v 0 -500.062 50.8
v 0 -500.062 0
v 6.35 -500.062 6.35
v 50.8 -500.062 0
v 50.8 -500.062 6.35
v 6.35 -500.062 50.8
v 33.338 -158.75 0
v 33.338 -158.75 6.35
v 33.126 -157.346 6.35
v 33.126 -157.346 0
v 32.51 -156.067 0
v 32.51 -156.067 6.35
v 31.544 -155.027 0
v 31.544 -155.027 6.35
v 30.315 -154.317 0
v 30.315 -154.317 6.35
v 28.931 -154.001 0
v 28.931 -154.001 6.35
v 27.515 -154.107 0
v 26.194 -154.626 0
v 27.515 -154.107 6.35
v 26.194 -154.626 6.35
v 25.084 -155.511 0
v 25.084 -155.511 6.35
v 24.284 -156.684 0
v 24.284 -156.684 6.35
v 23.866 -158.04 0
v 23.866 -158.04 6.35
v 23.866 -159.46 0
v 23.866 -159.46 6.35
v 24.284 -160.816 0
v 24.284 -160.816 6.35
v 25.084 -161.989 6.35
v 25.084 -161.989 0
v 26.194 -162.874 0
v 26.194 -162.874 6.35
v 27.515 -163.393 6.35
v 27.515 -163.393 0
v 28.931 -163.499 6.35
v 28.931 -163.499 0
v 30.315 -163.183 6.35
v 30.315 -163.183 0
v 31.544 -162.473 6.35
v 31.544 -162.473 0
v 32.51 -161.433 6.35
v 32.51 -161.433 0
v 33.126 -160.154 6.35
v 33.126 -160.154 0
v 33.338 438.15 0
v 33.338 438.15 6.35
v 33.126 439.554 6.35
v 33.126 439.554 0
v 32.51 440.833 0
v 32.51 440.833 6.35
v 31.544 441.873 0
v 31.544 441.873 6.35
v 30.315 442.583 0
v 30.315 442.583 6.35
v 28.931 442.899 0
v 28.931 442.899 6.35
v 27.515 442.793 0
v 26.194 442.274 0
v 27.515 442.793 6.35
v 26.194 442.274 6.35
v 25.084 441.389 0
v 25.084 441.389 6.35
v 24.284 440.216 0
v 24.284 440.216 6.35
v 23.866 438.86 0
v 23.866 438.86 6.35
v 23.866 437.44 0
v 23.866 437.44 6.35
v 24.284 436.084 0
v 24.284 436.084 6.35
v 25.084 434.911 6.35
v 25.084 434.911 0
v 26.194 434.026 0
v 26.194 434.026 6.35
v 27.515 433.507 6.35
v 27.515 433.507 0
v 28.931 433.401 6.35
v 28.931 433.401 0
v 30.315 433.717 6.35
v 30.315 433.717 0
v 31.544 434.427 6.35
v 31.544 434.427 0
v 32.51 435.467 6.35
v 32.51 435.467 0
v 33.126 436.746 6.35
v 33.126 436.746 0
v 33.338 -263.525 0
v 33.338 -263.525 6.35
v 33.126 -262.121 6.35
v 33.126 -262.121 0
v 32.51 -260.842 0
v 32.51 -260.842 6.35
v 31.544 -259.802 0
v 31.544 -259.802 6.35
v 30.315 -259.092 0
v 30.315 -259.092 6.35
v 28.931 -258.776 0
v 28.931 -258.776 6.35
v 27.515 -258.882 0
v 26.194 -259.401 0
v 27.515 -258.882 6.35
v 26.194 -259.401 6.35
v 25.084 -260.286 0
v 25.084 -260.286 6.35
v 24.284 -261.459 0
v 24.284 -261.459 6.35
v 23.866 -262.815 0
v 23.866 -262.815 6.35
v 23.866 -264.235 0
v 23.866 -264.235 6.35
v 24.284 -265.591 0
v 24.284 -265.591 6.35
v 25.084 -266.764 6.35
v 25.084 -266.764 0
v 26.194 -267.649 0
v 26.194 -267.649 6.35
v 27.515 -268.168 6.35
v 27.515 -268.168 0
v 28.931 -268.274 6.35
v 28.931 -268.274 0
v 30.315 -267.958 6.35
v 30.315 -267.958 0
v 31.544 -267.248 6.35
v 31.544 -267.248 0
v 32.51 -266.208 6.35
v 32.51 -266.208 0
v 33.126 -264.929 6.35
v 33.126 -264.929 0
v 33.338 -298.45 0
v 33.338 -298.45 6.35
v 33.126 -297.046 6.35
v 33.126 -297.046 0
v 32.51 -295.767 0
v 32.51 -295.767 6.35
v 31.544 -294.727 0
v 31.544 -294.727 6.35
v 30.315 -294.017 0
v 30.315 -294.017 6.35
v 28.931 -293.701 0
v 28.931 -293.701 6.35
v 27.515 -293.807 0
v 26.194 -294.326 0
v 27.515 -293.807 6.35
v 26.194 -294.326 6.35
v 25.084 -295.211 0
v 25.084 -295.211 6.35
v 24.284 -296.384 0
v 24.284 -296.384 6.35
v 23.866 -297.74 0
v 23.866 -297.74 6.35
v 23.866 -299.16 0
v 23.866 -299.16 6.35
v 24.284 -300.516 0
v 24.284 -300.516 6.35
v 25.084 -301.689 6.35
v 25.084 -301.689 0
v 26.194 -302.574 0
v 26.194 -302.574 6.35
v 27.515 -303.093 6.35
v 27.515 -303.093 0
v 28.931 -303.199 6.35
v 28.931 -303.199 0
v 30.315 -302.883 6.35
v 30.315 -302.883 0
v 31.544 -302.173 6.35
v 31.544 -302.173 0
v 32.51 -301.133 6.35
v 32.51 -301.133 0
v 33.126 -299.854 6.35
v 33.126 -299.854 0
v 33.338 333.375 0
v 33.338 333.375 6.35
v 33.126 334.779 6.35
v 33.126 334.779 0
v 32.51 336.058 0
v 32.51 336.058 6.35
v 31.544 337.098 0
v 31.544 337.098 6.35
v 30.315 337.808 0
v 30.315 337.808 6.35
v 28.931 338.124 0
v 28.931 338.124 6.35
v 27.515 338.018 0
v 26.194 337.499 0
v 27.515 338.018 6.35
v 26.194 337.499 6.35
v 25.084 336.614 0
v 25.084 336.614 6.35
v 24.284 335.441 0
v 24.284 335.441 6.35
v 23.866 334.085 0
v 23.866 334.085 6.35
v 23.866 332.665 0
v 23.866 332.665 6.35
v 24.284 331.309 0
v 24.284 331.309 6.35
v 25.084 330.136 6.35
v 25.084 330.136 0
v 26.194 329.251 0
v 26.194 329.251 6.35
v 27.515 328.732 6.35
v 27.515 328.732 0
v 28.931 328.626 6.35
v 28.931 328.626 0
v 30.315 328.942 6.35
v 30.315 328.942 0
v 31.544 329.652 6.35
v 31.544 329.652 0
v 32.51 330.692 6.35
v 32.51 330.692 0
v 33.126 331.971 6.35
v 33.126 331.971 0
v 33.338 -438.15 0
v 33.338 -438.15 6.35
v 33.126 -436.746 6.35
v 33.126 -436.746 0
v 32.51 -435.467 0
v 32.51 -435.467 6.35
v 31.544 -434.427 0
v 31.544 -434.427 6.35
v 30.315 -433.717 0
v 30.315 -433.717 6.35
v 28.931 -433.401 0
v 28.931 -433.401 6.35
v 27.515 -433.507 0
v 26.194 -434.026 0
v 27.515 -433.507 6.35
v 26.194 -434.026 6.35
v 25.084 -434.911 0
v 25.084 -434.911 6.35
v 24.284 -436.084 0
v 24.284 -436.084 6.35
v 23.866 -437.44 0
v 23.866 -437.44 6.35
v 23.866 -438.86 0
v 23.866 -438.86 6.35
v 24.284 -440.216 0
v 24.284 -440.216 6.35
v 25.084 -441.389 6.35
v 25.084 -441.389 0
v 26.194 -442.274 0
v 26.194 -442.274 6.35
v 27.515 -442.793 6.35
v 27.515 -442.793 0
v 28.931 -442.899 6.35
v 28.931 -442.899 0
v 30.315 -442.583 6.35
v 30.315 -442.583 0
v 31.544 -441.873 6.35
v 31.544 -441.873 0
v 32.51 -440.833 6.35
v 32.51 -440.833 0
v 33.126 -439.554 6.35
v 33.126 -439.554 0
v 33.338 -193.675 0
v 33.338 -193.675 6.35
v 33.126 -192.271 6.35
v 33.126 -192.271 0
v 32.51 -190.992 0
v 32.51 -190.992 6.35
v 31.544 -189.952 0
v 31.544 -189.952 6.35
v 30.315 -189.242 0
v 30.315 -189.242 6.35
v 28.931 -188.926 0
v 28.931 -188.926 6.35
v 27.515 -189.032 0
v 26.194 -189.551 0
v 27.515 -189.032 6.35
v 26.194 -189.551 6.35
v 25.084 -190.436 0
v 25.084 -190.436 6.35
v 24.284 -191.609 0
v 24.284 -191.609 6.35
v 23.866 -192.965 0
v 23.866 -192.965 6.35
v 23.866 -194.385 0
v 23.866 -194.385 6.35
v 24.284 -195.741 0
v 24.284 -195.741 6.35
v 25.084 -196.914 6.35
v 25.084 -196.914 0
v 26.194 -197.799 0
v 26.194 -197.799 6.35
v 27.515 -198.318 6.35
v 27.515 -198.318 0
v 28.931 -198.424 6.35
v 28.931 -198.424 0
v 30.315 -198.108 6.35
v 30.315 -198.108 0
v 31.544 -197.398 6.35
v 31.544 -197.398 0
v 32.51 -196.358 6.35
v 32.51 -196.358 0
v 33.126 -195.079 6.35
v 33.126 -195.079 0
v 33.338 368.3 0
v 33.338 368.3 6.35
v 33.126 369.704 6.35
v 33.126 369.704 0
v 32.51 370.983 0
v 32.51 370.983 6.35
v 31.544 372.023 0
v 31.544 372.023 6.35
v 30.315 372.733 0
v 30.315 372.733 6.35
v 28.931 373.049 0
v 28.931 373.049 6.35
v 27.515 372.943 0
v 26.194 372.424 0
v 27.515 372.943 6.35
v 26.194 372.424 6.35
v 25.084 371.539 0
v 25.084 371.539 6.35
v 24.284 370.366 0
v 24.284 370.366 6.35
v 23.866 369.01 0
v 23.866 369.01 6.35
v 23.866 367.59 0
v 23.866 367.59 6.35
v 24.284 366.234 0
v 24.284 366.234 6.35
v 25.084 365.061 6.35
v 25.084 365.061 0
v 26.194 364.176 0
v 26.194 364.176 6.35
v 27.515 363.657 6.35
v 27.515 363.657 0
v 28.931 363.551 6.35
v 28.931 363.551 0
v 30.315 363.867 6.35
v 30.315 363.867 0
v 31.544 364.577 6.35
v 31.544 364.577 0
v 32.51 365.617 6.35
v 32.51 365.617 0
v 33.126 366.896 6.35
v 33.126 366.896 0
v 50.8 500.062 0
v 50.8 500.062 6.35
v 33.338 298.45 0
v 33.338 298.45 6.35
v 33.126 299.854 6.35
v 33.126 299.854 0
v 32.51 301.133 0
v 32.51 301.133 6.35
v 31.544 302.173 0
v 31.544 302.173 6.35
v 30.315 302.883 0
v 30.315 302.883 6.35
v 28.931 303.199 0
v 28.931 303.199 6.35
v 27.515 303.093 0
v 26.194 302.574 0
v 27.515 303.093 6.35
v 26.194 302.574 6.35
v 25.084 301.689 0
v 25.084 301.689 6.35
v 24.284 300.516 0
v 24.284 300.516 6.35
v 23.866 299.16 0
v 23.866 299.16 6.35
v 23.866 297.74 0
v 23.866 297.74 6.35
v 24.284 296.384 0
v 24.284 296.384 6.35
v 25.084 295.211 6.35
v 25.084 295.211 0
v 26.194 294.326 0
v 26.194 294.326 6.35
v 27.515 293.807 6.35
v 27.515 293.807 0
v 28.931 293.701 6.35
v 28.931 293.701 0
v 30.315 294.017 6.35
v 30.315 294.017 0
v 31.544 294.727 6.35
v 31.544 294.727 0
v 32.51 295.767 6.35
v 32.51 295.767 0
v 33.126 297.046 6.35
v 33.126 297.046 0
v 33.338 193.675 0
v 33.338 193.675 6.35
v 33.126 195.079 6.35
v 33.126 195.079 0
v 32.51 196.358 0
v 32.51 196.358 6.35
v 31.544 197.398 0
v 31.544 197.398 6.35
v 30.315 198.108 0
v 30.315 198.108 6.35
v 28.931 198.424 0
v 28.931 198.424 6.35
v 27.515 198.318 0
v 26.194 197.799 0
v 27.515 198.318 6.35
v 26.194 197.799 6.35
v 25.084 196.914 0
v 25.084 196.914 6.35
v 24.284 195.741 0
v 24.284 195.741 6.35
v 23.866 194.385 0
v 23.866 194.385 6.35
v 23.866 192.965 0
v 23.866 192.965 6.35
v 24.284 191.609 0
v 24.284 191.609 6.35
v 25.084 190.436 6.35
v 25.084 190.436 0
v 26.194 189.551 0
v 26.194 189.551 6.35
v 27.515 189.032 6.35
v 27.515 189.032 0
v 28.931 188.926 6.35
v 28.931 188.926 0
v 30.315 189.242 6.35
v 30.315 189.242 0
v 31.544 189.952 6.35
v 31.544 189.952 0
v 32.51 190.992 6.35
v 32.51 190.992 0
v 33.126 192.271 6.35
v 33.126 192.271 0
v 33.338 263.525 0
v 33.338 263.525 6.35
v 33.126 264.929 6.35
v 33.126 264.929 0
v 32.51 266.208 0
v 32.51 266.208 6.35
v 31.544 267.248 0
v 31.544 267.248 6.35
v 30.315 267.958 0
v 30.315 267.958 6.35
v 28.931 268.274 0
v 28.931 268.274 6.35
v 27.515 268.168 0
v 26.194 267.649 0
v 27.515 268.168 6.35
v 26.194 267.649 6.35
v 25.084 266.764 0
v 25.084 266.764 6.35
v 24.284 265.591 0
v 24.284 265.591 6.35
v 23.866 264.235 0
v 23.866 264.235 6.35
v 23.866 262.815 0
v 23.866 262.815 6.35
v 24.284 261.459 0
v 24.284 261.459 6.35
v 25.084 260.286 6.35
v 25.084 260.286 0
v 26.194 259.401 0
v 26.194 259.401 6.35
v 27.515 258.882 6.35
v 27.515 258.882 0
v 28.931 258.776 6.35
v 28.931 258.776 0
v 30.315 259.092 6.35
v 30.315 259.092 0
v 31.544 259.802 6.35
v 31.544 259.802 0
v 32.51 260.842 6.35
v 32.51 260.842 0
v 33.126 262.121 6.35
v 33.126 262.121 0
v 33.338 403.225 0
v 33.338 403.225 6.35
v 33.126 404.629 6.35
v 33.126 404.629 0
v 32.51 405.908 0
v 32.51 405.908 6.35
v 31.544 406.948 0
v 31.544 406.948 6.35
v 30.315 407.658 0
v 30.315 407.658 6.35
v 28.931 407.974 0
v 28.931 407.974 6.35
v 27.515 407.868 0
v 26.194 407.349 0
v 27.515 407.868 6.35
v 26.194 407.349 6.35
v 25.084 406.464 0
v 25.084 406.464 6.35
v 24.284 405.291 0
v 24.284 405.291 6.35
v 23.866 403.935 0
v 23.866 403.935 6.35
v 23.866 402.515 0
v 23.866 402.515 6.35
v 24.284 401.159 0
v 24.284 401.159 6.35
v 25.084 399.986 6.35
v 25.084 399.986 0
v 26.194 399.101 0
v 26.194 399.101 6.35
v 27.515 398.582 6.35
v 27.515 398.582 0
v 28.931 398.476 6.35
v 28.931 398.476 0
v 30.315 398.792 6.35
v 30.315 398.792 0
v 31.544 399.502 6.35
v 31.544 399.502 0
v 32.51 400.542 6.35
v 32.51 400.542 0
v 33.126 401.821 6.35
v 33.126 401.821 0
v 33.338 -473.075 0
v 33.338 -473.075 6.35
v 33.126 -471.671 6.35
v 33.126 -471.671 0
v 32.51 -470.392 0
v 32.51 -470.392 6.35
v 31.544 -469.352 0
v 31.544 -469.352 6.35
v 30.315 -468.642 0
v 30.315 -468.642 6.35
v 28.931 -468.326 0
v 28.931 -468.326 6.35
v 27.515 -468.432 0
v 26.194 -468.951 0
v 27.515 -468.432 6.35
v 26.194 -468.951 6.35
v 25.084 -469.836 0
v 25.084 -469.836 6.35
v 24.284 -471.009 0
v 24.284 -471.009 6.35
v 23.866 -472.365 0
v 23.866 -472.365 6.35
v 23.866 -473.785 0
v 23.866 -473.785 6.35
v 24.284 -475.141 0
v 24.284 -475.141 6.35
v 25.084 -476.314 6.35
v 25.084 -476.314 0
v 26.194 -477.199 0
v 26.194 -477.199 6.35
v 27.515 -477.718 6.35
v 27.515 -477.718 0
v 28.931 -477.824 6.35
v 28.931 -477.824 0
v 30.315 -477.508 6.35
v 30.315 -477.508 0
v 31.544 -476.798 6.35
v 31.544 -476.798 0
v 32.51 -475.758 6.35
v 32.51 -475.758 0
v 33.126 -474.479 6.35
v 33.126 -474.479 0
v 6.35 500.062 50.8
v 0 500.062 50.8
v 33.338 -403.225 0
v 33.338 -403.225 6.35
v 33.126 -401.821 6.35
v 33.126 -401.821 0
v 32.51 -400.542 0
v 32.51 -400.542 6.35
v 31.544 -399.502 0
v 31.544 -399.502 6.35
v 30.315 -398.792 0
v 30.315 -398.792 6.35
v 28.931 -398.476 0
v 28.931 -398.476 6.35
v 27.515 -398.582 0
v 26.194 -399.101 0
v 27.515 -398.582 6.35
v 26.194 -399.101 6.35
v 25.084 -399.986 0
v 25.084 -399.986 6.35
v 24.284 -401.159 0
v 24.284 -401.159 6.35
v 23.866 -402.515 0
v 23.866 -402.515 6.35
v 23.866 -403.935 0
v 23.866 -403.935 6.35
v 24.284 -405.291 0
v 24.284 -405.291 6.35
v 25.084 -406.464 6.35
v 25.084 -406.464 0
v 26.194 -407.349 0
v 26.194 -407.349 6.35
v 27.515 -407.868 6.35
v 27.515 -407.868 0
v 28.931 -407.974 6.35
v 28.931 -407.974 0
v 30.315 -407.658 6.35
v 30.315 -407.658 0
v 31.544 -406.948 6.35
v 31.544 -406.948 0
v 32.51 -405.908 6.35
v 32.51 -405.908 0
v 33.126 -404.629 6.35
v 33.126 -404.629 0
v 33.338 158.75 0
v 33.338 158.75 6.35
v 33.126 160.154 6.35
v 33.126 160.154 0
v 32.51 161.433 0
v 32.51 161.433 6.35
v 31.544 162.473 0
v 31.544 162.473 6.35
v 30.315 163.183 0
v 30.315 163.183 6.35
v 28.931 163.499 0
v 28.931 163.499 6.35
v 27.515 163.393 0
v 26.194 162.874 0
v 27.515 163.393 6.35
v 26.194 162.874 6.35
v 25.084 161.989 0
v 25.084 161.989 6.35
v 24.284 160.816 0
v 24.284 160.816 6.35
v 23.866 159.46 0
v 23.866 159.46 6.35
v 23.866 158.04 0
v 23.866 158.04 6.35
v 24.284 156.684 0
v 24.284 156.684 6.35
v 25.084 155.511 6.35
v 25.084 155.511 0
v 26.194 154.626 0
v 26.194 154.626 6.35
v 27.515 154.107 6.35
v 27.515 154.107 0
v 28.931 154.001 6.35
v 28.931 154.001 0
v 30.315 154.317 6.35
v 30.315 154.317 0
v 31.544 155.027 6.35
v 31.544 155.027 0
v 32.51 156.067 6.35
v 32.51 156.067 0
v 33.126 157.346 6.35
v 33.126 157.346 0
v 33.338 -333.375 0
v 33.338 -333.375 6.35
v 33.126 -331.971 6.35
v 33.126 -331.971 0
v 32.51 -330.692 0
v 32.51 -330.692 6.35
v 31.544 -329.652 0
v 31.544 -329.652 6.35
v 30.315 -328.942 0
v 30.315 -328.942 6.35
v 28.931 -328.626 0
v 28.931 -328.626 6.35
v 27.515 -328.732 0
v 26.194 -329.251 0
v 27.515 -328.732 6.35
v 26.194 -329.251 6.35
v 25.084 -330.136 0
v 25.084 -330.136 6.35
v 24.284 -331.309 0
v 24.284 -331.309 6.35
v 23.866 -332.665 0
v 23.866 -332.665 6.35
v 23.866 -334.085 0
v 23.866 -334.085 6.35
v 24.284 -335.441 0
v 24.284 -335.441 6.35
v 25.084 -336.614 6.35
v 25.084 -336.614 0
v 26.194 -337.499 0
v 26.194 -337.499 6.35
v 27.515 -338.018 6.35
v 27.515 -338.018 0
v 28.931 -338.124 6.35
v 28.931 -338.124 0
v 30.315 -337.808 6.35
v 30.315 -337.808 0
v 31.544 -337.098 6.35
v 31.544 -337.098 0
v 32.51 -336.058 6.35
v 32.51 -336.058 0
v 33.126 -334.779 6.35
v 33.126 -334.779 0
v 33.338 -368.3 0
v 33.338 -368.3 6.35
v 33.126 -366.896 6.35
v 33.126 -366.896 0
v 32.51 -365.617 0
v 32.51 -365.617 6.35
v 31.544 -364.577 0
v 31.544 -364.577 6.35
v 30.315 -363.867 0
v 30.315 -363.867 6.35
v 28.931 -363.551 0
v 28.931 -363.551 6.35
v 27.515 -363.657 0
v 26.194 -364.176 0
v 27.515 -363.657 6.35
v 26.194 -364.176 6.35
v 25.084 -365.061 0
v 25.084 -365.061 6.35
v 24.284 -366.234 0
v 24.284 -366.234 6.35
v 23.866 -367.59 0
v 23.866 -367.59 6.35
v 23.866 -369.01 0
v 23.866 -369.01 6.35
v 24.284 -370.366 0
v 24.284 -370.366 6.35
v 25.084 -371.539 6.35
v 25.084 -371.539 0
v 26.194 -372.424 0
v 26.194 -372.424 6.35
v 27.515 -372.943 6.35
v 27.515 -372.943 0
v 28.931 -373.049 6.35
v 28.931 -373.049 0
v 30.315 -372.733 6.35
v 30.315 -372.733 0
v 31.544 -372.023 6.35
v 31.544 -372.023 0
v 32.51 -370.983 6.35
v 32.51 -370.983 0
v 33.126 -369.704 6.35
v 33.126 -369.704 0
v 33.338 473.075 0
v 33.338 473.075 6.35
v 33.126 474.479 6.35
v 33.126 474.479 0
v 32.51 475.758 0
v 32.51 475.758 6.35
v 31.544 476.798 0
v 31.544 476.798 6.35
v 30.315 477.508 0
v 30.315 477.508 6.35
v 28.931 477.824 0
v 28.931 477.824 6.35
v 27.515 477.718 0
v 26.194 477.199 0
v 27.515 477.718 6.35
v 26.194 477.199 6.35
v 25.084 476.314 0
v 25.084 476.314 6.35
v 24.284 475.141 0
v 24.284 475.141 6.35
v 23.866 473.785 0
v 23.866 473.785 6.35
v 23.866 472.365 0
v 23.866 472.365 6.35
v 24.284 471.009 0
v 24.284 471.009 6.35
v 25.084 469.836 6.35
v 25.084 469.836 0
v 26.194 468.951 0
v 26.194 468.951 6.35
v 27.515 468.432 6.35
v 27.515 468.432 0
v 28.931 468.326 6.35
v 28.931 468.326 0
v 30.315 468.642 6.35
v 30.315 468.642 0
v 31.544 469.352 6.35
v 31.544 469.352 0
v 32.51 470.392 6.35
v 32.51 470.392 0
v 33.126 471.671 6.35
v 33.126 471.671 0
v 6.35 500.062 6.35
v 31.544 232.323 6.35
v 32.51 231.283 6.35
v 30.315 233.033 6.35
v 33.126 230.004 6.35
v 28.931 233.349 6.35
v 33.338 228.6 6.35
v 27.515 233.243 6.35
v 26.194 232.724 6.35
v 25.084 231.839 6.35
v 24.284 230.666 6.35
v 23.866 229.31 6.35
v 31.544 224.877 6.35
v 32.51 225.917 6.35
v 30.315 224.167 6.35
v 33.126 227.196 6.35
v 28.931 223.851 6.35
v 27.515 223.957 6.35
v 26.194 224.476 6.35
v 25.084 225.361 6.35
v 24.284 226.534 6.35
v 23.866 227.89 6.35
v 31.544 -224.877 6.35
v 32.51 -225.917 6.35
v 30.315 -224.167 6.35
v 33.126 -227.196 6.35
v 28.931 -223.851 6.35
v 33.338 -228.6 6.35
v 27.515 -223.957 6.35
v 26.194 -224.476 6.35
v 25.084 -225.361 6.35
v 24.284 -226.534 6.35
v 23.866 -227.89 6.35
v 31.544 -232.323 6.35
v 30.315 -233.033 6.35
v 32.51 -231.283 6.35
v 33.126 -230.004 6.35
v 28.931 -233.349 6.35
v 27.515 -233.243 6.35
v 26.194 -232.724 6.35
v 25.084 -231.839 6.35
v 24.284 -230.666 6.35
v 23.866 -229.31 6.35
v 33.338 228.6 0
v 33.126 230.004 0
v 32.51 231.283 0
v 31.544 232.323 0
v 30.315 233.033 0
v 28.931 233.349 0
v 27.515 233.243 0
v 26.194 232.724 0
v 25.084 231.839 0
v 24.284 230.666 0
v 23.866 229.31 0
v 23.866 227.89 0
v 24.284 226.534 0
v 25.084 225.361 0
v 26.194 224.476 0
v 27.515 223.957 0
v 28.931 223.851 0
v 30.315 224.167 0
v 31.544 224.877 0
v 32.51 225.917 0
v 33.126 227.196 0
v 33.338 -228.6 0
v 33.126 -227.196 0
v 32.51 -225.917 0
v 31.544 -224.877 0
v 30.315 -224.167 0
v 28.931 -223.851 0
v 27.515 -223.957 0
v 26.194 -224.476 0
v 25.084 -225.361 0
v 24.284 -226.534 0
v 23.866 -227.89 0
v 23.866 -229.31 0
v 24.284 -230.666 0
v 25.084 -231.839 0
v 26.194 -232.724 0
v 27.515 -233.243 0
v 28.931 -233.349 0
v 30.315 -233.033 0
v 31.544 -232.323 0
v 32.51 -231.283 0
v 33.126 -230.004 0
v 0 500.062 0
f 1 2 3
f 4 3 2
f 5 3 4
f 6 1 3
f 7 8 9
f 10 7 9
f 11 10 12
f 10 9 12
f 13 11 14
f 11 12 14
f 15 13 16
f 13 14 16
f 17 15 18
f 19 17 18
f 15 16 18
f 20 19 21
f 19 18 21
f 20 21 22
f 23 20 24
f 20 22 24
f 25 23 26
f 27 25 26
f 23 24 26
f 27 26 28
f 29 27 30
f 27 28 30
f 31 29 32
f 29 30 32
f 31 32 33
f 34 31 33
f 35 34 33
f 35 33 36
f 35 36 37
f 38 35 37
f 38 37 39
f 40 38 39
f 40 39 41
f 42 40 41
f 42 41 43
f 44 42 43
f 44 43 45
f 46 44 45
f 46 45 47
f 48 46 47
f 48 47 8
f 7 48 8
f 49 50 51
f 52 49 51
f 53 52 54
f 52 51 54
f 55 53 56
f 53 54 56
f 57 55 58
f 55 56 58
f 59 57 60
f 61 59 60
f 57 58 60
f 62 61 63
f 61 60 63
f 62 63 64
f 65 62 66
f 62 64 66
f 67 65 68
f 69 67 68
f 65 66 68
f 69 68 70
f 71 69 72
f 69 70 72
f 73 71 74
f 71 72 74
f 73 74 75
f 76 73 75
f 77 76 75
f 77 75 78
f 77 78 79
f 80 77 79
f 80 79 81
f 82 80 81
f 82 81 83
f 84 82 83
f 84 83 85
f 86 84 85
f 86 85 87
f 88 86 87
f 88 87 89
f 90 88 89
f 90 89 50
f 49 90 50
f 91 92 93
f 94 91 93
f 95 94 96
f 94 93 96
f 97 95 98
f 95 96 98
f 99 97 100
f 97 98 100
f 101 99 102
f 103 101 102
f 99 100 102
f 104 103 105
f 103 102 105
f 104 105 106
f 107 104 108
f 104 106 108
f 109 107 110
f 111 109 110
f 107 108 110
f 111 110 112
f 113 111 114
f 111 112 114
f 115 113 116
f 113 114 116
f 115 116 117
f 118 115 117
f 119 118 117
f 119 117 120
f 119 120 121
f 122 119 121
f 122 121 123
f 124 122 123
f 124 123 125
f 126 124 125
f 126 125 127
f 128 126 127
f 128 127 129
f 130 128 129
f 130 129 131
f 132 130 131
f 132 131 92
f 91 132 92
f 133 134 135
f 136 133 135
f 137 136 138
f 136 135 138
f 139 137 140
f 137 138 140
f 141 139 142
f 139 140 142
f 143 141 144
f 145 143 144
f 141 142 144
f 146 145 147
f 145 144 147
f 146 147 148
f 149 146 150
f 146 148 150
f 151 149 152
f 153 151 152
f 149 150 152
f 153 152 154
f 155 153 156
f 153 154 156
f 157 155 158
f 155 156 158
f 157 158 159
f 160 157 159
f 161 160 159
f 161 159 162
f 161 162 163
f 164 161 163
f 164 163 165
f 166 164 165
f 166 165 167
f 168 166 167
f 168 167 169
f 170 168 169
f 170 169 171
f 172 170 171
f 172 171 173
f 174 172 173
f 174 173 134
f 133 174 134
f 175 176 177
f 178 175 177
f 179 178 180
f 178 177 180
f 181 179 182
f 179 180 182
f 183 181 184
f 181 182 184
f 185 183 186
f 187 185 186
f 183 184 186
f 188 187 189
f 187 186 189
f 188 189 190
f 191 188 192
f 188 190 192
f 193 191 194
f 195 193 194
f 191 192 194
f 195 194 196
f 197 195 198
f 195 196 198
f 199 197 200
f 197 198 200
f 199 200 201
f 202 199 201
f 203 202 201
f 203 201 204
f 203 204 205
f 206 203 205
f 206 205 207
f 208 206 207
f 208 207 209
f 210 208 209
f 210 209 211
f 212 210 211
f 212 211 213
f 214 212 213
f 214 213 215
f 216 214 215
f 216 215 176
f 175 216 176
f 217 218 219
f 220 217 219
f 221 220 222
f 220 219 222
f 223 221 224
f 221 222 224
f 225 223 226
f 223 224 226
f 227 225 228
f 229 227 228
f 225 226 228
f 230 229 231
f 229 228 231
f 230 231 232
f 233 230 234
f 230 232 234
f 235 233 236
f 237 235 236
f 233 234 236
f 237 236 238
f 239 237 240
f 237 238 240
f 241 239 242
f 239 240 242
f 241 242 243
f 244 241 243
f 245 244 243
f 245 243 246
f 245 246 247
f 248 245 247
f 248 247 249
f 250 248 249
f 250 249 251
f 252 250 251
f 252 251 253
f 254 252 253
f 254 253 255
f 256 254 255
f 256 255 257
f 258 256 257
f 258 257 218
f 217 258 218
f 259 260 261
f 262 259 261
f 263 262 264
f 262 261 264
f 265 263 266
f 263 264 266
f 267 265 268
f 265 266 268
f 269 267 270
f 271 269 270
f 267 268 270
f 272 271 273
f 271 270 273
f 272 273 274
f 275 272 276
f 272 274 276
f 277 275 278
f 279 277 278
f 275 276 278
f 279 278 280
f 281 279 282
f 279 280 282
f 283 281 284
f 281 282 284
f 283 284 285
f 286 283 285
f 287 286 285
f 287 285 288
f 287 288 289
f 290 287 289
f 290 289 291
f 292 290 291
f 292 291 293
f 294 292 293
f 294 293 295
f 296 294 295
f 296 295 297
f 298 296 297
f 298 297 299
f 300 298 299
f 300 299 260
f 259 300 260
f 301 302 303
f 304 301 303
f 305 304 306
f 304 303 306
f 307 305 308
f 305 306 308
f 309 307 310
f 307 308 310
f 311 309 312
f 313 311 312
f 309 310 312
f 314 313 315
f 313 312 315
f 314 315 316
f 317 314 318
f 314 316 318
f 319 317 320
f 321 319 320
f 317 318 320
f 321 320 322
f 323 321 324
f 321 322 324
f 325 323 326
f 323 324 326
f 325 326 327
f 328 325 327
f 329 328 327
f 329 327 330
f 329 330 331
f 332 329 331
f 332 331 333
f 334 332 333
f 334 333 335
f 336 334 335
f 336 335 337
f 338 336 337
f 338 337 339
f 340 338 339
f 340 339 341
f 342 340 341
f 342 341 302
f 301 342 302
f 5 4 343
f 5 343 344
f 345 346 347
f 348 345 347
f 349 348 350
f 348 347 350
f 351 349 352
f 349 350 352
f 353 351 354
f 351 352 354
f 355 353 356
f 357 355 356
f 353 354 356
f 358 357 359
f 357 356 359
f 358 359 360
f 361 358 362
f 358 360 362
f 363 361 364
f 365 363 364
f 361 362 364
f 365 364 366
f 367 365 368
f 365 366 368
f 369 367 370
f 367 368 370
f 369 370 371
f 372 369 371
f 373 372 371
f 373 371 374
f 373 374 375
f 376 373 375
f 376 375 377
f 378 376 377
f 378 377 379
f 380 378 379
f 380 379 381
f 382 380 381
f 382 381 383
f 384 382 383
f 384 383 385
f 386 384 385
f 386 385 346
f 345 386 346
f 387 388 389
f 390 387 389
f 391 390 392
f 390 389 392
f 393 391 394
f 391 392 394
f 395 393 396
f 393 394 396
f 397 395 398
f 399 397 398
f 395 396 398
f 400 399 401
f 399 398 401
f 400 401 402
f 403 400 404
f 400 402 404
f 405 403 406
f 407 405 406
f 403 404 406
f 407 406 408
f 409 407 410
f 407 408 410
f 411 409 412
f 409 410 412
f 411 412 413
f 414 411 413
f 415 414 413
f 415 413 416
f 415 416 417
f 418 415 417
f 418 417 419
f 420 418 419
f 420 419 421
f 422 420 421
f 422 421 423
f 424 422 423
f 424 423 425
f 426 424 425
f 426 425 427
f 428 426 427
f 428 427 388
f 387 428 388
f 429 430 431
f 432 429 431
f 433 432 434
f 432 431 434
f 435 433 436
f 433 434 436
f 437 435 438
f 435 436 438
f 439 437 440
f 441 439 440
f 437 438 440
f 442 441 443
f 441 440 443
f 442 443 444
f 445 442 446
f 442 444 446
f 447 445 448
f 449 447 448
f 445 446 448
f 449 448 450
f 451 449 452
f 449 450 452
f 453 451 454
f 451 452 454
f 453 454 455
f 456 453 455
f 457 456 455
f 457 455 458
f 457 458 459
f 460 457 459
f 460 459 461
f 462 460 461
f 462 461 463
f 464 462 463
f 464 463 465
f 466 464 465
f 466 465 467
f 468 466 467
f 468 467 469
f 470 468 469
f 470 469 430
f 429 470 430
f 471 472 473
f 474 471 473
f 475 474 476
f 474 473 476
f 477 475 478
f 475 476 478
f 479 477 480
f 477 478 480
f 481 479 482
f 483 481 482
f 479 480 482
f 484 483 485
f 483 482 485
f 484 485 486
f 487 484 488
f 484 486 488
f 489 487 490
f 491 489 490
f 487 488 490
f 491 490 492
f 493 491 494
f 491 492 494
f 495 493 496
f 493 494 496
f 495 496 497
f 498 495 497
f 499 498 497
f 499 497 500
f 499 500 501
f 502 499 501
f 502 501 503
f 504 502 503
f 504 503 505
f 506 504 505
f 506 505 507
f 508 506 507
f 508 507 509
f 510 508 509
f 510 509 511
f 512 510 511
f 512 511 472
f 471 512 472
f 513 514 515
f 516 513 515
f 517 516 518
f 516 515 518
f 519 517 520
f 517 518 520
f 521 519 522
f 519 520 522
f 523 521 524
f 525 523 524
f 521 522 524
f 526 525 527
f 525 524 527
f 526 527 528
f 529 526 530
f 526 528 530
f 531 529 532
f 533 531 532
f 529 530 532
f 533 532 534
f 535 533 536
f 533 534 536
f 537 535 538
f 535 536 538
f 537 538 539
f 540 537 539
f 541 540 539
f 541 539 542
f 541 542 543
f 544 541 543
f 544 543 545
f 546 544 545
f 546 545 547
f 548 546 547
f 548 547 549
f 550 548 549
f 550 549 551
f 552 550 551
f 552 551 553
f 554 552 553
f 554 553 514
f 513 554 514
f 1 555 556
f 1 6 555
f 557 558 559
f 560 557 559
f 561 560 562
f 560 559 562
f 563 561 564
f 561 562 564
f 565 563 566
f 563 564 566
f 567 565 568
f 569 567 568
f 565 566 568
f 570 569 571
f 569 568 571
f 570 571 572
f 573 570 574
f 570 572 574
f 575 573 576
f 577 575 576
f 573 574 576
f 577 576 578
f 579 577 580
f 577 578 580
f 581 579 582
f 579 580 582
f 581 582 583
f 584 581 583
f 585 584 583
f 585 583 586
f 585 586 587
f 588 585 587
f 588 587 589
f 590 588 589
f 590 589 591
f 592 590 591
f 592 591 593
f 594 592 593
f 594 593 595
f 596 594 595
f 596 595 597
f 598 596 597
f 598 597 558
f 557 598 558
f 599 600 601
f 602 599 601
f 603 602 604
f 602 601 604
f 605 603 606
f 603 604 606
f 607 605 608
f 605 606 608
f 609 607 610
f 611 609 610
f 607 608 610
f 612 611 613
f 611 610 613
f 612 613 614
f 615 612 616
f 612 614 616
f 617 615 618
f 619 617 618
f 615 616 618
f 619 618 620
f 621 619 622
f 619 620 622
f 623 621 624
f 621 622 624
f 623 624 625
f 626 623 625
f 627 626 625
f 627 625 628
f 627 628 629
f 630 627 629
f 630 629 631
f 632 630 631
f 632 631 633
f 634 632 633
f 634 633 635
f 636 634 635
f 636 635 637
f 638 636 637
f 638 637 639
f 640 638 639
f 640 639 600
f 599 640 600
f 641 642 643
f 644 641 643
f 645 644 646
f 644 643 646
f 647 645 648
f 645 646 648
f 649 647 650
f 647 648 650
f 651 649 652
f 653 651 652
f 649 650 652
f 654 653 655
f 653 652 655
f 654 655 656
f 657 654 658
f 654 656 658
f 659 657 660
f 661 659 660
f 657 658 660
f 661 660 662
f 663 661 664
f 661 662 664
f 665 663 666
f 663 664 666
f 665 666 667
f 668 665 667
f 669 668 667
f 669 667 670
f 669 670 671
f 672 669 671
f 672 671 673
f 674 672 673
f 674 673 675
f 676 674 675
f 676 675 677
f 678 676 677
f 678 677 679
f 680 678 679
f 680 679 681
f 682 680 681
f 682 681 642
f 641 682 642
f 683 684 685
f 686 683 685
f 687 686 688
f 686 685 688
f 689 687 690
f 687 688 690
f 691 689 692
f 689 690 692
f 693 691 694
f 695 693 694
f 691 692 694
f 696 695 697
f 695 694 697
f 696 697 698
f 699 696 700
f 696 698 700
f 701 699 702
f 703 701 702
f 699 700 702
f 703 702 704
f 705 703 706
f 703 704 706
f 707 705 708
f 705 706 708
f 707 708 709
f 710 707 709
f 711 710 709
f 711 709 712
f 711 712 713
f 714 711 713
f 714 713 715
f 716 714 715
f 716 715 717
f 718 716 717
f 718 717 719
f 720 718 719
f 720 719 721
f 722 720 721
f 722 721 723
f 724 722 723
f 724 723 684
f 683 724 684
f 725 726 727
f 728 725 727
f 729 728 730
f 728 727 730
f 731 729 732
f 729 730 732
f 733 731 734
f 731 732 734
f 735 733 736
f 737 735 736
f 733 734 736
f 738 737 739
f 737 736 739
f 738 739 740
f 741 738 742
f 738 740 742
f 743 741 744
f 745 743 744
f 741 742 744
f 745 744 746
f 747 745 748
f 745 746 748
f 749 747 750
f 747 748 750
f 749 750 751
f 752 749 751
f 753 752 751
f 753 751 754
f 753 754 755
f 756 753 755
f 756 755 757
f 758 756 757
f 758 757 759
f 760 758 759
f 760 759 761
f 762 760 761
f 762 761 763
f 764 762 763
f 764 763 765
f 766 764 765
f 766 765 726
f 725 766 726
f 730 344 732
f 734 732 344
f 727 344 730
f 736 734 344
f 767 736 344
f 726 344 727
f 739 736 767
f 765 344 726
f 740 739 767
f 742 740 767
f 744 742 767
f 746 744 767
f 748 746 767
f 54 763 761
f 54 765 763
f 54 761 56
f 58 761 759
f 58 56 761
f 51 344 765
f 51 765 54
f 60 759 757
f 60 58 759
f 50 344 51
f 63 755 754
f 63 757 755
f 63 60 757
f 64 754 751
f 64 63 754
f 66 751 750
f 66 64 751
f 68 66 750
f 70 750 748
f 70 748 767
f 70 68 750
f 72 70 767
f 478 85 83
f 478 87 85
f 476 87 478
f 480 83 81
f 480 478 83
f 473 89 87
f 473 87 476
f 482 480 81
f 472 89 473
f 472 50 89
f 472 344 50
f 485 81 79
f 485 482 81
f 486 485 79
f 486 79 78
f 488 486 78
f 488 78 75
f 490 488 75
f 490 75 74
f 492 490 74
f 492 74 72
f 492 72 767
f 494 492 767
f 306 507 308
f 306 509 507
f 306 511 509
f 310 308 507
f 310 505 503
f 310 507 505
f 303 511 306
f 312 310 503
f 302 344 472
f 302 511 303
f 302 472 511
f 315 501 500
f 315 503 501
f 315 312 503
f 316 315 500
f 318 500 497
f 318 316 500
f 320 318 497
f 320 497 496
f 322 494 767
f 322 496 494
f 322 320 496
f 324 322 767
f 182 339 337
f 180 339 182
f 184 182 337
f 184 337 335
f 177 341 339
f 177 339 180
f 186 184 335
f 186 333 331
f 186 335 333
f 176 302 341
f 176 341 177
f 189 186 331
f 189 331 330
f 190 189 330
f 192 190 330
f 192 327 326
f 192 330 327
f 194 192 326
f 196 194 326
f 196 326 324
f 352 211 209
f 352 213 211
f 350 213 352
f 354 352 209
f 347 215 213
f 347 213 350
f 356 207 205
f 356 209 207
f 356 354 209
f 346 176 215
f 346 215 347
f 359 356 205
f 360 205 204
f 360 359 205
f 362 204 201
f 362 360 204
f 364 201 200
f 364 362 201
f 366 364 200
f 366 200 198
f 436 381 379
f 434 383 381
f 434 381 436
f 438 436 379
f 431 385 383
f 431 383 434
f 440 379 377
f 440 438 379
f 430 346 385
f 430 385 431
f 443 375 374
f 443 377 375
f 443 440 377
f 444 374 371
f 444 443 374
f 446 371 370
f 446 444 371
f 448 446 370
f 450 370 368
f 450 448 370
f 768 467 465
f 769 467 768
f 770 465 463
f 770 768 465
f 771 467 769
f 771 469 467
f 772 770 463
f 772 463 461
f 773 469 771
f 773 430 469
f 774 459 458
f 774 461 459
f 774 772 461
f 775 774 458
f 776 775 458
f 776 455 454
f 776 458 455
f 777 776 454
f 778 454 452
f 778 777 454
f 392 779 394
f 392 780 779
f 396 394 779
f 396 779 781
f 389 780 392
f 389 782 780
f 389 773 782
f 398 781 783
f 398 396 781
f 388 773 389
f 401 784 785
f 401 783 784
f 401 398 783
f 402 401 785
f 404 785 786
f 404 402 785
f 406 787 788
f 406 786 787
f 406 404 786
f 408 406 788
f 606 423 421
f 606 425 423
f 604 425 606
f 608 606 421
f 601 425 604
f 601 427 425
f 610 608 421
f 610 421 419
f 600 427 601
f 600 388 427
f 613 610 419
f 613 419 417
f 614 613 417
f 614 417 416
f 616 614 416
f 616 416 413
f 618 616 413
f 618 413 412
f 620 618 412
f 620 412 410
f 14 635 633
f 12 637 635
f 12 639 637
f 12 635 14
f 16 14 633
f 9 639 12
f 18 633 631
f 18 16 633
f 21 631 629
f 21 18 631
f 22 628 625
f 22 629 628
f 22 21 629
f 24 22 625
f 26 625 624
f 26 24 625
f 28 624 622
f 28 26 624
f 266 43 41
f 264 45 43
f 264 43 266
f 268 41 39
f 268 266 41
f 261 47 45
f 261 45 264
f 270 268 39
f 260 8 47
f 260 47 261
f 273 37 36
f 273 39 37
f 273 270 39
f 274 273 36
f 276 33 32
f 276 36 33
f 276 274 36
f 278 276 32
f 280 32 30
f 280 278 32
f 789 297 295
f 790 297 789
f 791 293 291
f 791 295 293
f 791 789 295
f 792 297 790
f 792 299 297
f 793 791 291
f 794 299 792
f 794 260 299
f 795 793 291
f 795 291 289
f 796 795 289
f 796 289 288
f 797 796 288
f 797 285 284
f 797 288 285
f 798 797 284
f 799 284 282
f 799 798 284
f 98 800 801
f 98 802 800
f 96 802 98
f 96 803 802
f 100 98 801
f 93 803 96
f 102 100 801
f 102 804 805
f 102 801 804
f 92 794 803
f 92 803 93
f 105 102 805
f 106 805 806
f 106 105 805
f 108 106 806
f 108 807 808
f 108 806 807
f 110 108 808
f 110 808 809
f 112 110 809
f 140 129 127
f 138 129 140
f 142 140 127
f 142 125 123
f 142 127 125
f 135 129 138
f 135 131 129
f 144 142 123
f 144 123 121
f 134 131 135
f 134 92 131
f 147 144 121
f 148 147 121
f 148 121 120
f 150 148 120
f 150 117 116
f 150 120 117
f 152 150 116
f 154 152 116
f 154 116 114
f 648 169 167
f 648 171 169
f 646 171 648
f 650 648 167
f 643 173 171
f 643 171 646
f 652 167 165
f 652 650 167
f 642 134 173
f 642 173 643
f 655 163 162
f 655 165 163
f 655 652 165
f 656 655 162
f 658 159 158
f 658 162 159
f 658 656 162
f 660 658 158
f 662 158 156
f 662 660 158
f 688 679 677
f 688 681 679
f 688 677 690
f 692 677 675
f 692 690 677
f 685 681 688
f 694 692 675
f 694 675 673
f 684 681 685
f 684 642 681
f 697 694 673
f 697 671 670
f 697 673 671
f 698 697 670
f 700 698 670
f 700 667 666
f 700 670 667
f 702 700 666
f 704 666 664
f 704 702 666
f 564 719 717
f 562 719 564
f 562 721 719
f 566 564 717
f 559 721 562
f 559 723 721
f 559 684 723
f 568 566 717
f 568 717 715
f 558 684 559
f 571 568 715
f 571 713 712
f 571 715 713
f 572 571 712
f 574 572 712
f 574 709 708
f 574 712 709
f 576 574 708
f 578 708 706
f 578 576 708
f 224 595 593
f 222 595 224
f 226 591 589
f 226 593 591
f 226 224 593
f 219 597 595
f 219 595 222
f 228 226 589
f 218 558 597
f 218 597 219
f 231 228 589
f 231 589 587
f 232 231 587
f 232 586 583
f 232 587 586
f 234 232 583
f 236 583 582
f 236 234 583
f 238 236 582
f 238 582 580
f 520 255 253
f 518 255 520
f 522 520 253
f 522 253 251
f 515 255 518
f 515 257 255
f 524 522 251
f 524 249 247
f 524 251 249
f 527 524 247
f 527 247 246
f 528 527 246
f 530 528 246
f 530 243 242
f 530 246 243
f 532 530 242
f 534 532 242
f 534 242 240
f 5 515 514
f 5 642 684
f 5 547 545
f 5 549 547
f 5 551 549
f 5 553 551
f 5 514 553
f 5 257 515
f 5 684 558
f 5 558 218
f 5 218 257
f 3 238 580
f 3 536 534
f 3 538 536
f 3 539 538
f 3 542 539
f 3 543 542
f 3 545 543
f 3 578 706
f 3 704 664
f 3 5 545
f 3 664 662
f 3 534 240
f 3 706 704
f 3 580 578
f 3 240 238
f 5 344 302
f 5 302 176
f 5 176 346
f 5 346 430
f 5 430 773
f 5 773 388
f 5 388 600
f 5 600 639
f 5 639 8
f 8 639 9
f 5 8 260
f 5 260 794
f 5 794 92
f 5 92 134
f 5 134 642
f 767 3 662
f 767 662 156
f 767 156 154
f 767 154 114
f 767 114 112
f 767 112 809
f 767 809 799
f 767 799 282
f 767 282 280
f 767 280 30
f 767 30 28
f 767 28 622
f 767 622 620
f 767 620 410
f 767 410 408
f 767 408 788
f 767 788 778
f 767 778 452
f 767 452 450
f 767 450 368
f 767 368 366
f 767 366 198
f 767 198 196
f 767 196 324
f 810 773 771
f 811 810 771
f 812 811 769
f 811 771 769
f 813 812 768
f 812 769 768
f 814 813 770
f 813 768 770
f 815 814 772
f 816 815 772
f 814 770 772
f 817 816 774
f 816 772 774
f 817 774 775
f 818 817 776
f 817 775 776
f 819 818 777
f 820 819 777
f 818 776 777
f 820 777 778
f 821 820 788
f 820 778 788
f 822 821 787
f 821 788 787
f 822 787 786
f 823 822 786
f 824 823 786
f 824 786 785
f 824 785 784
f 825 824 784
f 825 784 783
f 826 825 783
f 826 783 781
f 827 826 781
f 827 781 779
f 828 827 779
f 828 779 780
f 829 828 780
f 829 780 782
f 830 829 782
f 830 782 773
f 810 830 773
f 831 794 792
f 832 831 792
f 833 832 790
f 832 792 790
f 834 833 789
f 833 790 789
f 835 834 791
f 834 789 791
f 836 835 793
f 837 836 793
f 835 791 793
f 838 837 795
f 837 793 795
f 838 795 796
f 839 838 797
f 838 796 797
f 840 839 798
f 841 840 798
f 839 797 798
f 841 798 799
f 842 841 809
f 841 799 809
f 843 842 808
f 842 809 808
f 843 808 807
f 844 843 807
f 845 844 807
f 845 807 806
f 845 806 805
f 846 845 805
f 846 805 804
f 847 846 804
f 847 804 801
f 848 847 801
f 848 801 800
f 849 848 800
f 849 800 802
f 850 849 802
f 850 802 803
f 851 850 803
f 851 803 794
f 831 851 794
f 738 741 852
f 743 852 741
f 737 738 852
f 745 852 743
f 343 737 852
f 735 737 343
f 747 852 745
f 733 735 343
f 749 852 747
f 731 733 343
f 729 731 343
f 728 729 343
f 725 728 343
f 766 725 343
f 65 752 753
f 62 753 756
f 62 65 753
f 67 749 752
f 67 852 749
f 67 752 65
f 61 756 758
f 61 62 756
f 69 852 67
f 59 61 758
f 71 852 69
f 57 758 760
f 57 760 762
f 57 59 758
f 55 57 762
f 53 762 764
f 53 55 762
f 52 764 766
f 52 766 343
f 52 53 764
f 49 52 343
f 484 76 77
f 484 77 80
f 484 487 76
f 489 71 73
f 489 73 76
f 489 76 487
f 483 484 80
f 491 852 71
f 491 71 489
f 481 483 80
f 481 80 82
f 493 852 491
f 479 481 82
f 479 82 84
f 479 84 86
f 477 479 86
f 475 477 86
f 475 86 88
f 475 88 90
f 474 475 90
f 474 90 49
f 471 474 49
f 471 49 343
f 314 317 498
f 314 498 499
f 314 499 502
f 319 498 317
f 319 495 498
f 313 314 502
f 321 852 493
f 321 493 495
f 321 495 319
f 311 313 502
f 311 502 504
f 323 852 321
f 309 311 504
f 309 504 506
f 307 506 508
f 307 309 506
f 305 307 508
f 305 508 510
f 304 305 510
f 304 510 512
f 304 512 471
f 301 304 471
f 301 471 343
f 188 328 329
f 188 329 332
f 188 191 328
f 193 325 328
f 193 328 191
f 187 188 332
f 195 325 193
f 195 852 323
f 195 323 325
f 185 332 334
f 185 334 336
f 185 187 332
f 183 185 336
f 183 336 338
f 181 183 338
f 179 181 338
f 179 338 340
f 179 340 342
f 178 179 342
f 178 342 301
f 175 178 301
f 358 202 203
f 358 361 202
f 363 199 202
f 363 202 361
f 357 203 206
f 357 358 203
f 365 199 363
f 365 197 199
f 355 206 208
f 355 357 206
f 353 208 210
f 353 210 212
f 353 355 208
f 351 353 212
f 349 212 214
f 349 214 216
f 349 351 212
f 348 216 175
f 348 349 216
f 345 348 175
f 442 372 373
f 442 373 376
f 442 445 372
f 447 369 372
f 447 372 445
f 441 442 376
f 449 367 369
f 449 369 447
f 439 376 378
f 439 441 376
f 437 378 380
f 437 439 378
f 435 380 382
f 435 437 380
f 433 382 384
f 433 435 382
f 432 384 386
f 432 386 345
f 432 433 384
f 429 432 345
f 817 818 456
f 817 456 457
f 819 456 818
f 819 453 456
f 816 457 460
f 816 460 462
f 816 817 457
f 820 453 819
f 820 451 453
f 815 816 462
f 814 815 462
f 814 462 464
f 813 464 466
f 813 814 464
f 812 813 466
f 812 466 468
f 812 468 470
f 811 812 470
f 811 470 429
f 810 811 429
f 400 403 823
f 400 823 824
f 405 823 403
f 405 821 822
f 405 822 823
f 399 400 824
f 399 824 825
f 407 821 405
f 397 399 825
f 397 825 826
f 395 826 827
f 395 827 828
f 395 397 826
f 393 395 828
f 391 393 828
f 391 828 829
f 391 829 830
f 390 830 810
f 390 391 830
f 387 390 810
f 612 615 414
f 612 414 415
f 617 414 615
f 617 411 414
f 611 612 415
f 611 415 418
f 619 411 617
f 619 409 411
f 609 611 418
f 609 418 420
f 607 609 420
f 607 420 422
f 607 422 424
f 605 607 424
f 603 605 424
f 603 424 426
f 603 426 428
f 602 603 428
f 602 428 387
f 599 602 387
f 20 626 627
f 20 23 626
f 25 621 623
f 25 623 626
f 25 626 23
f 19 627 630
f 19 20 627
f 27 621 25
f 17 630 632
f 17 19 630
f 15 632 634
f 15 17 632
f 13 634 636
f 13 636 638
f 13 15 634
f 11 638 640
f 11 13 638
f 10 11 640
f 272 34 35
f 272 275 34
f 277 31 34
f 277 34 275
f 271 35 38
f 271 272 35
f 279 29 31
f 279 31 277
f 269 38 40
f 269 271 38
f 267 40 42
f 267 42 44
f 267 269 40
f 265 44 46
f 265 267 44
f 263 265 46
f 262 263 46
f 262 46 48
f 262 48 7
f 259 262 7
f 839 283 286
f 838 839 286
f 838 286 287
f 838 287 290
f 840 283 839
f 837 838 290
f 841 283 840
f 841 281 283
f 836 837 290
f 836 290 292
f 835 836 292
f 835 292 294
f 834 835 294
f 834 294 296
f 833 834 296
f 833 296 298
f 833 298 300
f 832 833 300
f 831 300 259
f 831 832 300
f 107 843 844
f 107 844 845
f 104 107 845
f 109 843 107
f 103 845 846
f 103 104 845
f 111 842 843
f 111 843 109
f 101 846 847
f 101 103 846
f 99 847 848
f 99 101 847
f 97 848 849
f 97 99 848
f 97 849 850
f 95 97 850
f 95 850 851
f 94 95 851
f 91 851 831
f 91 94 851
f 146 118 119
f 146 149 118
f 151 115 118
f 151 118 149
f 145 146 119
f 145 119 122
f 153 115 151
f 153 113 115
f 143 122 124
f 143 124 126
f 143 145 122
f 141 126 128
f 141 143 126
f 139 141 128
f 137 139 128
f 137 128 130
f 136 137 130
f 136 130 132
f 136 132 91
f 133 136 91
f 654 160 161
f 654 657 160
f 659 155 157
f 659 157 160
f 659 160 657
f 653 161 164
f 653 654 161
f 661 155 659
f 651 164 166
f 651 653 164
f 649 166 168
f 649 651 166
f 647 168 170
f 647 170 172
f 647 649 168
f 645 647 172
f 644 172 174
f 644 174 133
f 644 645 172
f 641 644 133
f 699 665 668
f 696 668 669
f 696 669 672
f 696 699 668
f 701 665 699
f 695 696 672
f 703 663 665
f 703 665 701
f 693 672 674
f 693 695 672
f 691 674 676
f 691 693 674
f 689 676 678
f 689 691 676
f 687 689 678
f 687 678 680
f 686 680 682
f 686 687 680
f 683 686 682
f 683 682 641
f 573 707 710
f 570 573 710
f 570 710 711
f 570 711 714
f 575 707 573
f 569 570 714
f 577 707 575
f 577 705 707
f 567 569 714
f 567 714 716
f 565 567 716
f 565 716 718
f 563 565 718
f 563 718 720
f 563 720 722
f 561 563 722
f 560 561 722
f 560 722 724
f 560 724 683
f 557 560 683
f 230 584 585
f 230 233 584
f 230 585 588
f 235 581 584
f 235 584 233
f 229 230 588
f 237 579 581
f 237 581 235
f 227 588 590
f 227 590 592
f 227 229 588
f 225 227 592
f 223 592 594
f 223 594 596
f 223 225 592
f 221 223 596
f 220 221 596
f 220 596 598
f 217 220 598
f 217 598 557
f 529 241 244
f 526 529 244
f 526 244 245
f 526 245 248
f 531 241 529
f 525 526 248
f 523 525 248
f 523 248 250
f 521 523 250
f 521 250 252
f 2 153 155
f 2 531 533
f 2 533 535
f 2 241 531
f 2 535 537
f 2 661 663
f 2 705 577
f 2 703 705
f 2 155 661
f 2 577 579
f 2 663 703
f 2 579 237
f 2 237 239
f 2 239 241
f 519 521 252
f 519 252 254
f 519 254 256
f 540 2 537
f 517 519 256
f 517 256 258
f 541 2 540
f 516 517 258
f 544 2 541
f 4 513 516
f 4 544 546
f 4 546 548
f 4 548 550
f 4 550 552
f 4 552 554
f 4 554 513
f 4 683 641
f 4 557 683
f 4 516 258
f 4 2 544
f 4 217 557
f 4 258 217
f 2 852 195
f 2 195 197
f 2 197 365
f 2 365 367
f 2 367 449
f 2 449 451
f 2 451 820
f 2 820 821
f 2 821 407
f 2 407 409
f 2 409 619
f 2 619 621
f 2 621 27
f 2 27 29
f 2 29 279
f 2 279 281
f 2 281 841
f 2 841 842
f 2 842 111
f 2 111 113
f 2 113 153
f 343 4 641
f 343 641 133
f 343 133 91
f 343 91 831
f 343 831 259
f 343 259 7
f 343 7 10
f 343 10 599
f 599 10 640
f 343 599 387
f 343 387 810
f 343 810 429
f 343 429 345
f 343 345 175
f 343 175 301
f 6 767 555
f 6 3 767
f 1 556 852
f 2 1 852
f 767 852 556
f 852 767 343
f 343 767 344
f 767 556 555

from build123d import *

# Parameters (mm, degrees)
F1_DEPTH = 500.0625
F2_R     = 4.7625
F3_DEPTH = 6.351


with BuildPart() as f1:
    # F0 (on Front) → F1 (new body, symmetric)
    with BuildSketch(Plane.XZ):
        Polygon((0, 50.8), (0, 0), (50.8, 0), (50.8, 6.35), (6.35, 6.35), (6.35, 50.8), align=None)
    extrude(amount=F1_DEPTH, both=True)

    # F2 (on face) → F3 (cut, through all)
    with BuildSketch(Plane.XY.offset(6.35)):
        with Locations((28.575, 473.075)):
            Circle(F2_R)
        with Locations((28.575, 438.15)):
            Circle(F2_R)
        with Locations((28.575, 403.225)):
            Circle(F2_R)
        with Locations((28.575, 368.3)):
            Circle(F2_R)
        with Locations((28.575, 333.375)):
            Circle(F2_R)
        with Locations((28.575, 298.45)):
            Circle(F2_R)
        with Locations((28.575, 263.525)):
            Circle(F2_R)
        with Locations((28.575, 228.6)):
            Circle(F2_R)
        with Locations((28.575, 193.675)):
            Circle(F2_R)
        with Locations((28.575, 158.75)):
            Circle(F2_R)
        with Locations((28.575, -158.75)):
            Circle(F2_R)
        with Locations((28.575, -193.675)):
            Circle(F2_R)
        with Locations((28.575, -228.6)):
            Circle(F2_R)
        with Locations((28.575, -263.525)):
            Circle(F2_R)
        with Locations((28.575, -298.45)):
            Circle(F2_R)
        with Locations((28.575, -333.375)):
            Circle(F2_R)
        with Locations((28.575, -473.075)):
            Circle(F2_R)
        with Locations((28.575, -438.15)):
            Circle(F2_R)
        with Locations((28.575, -403.225)):
            Circle(F2_R)
        with Locations((28.575, -368.3)):
            Circle(F2_R)
    extrude(amount=-F3_DEPTH, mode=Mode.SUBTRACT)


solid = f1.part
